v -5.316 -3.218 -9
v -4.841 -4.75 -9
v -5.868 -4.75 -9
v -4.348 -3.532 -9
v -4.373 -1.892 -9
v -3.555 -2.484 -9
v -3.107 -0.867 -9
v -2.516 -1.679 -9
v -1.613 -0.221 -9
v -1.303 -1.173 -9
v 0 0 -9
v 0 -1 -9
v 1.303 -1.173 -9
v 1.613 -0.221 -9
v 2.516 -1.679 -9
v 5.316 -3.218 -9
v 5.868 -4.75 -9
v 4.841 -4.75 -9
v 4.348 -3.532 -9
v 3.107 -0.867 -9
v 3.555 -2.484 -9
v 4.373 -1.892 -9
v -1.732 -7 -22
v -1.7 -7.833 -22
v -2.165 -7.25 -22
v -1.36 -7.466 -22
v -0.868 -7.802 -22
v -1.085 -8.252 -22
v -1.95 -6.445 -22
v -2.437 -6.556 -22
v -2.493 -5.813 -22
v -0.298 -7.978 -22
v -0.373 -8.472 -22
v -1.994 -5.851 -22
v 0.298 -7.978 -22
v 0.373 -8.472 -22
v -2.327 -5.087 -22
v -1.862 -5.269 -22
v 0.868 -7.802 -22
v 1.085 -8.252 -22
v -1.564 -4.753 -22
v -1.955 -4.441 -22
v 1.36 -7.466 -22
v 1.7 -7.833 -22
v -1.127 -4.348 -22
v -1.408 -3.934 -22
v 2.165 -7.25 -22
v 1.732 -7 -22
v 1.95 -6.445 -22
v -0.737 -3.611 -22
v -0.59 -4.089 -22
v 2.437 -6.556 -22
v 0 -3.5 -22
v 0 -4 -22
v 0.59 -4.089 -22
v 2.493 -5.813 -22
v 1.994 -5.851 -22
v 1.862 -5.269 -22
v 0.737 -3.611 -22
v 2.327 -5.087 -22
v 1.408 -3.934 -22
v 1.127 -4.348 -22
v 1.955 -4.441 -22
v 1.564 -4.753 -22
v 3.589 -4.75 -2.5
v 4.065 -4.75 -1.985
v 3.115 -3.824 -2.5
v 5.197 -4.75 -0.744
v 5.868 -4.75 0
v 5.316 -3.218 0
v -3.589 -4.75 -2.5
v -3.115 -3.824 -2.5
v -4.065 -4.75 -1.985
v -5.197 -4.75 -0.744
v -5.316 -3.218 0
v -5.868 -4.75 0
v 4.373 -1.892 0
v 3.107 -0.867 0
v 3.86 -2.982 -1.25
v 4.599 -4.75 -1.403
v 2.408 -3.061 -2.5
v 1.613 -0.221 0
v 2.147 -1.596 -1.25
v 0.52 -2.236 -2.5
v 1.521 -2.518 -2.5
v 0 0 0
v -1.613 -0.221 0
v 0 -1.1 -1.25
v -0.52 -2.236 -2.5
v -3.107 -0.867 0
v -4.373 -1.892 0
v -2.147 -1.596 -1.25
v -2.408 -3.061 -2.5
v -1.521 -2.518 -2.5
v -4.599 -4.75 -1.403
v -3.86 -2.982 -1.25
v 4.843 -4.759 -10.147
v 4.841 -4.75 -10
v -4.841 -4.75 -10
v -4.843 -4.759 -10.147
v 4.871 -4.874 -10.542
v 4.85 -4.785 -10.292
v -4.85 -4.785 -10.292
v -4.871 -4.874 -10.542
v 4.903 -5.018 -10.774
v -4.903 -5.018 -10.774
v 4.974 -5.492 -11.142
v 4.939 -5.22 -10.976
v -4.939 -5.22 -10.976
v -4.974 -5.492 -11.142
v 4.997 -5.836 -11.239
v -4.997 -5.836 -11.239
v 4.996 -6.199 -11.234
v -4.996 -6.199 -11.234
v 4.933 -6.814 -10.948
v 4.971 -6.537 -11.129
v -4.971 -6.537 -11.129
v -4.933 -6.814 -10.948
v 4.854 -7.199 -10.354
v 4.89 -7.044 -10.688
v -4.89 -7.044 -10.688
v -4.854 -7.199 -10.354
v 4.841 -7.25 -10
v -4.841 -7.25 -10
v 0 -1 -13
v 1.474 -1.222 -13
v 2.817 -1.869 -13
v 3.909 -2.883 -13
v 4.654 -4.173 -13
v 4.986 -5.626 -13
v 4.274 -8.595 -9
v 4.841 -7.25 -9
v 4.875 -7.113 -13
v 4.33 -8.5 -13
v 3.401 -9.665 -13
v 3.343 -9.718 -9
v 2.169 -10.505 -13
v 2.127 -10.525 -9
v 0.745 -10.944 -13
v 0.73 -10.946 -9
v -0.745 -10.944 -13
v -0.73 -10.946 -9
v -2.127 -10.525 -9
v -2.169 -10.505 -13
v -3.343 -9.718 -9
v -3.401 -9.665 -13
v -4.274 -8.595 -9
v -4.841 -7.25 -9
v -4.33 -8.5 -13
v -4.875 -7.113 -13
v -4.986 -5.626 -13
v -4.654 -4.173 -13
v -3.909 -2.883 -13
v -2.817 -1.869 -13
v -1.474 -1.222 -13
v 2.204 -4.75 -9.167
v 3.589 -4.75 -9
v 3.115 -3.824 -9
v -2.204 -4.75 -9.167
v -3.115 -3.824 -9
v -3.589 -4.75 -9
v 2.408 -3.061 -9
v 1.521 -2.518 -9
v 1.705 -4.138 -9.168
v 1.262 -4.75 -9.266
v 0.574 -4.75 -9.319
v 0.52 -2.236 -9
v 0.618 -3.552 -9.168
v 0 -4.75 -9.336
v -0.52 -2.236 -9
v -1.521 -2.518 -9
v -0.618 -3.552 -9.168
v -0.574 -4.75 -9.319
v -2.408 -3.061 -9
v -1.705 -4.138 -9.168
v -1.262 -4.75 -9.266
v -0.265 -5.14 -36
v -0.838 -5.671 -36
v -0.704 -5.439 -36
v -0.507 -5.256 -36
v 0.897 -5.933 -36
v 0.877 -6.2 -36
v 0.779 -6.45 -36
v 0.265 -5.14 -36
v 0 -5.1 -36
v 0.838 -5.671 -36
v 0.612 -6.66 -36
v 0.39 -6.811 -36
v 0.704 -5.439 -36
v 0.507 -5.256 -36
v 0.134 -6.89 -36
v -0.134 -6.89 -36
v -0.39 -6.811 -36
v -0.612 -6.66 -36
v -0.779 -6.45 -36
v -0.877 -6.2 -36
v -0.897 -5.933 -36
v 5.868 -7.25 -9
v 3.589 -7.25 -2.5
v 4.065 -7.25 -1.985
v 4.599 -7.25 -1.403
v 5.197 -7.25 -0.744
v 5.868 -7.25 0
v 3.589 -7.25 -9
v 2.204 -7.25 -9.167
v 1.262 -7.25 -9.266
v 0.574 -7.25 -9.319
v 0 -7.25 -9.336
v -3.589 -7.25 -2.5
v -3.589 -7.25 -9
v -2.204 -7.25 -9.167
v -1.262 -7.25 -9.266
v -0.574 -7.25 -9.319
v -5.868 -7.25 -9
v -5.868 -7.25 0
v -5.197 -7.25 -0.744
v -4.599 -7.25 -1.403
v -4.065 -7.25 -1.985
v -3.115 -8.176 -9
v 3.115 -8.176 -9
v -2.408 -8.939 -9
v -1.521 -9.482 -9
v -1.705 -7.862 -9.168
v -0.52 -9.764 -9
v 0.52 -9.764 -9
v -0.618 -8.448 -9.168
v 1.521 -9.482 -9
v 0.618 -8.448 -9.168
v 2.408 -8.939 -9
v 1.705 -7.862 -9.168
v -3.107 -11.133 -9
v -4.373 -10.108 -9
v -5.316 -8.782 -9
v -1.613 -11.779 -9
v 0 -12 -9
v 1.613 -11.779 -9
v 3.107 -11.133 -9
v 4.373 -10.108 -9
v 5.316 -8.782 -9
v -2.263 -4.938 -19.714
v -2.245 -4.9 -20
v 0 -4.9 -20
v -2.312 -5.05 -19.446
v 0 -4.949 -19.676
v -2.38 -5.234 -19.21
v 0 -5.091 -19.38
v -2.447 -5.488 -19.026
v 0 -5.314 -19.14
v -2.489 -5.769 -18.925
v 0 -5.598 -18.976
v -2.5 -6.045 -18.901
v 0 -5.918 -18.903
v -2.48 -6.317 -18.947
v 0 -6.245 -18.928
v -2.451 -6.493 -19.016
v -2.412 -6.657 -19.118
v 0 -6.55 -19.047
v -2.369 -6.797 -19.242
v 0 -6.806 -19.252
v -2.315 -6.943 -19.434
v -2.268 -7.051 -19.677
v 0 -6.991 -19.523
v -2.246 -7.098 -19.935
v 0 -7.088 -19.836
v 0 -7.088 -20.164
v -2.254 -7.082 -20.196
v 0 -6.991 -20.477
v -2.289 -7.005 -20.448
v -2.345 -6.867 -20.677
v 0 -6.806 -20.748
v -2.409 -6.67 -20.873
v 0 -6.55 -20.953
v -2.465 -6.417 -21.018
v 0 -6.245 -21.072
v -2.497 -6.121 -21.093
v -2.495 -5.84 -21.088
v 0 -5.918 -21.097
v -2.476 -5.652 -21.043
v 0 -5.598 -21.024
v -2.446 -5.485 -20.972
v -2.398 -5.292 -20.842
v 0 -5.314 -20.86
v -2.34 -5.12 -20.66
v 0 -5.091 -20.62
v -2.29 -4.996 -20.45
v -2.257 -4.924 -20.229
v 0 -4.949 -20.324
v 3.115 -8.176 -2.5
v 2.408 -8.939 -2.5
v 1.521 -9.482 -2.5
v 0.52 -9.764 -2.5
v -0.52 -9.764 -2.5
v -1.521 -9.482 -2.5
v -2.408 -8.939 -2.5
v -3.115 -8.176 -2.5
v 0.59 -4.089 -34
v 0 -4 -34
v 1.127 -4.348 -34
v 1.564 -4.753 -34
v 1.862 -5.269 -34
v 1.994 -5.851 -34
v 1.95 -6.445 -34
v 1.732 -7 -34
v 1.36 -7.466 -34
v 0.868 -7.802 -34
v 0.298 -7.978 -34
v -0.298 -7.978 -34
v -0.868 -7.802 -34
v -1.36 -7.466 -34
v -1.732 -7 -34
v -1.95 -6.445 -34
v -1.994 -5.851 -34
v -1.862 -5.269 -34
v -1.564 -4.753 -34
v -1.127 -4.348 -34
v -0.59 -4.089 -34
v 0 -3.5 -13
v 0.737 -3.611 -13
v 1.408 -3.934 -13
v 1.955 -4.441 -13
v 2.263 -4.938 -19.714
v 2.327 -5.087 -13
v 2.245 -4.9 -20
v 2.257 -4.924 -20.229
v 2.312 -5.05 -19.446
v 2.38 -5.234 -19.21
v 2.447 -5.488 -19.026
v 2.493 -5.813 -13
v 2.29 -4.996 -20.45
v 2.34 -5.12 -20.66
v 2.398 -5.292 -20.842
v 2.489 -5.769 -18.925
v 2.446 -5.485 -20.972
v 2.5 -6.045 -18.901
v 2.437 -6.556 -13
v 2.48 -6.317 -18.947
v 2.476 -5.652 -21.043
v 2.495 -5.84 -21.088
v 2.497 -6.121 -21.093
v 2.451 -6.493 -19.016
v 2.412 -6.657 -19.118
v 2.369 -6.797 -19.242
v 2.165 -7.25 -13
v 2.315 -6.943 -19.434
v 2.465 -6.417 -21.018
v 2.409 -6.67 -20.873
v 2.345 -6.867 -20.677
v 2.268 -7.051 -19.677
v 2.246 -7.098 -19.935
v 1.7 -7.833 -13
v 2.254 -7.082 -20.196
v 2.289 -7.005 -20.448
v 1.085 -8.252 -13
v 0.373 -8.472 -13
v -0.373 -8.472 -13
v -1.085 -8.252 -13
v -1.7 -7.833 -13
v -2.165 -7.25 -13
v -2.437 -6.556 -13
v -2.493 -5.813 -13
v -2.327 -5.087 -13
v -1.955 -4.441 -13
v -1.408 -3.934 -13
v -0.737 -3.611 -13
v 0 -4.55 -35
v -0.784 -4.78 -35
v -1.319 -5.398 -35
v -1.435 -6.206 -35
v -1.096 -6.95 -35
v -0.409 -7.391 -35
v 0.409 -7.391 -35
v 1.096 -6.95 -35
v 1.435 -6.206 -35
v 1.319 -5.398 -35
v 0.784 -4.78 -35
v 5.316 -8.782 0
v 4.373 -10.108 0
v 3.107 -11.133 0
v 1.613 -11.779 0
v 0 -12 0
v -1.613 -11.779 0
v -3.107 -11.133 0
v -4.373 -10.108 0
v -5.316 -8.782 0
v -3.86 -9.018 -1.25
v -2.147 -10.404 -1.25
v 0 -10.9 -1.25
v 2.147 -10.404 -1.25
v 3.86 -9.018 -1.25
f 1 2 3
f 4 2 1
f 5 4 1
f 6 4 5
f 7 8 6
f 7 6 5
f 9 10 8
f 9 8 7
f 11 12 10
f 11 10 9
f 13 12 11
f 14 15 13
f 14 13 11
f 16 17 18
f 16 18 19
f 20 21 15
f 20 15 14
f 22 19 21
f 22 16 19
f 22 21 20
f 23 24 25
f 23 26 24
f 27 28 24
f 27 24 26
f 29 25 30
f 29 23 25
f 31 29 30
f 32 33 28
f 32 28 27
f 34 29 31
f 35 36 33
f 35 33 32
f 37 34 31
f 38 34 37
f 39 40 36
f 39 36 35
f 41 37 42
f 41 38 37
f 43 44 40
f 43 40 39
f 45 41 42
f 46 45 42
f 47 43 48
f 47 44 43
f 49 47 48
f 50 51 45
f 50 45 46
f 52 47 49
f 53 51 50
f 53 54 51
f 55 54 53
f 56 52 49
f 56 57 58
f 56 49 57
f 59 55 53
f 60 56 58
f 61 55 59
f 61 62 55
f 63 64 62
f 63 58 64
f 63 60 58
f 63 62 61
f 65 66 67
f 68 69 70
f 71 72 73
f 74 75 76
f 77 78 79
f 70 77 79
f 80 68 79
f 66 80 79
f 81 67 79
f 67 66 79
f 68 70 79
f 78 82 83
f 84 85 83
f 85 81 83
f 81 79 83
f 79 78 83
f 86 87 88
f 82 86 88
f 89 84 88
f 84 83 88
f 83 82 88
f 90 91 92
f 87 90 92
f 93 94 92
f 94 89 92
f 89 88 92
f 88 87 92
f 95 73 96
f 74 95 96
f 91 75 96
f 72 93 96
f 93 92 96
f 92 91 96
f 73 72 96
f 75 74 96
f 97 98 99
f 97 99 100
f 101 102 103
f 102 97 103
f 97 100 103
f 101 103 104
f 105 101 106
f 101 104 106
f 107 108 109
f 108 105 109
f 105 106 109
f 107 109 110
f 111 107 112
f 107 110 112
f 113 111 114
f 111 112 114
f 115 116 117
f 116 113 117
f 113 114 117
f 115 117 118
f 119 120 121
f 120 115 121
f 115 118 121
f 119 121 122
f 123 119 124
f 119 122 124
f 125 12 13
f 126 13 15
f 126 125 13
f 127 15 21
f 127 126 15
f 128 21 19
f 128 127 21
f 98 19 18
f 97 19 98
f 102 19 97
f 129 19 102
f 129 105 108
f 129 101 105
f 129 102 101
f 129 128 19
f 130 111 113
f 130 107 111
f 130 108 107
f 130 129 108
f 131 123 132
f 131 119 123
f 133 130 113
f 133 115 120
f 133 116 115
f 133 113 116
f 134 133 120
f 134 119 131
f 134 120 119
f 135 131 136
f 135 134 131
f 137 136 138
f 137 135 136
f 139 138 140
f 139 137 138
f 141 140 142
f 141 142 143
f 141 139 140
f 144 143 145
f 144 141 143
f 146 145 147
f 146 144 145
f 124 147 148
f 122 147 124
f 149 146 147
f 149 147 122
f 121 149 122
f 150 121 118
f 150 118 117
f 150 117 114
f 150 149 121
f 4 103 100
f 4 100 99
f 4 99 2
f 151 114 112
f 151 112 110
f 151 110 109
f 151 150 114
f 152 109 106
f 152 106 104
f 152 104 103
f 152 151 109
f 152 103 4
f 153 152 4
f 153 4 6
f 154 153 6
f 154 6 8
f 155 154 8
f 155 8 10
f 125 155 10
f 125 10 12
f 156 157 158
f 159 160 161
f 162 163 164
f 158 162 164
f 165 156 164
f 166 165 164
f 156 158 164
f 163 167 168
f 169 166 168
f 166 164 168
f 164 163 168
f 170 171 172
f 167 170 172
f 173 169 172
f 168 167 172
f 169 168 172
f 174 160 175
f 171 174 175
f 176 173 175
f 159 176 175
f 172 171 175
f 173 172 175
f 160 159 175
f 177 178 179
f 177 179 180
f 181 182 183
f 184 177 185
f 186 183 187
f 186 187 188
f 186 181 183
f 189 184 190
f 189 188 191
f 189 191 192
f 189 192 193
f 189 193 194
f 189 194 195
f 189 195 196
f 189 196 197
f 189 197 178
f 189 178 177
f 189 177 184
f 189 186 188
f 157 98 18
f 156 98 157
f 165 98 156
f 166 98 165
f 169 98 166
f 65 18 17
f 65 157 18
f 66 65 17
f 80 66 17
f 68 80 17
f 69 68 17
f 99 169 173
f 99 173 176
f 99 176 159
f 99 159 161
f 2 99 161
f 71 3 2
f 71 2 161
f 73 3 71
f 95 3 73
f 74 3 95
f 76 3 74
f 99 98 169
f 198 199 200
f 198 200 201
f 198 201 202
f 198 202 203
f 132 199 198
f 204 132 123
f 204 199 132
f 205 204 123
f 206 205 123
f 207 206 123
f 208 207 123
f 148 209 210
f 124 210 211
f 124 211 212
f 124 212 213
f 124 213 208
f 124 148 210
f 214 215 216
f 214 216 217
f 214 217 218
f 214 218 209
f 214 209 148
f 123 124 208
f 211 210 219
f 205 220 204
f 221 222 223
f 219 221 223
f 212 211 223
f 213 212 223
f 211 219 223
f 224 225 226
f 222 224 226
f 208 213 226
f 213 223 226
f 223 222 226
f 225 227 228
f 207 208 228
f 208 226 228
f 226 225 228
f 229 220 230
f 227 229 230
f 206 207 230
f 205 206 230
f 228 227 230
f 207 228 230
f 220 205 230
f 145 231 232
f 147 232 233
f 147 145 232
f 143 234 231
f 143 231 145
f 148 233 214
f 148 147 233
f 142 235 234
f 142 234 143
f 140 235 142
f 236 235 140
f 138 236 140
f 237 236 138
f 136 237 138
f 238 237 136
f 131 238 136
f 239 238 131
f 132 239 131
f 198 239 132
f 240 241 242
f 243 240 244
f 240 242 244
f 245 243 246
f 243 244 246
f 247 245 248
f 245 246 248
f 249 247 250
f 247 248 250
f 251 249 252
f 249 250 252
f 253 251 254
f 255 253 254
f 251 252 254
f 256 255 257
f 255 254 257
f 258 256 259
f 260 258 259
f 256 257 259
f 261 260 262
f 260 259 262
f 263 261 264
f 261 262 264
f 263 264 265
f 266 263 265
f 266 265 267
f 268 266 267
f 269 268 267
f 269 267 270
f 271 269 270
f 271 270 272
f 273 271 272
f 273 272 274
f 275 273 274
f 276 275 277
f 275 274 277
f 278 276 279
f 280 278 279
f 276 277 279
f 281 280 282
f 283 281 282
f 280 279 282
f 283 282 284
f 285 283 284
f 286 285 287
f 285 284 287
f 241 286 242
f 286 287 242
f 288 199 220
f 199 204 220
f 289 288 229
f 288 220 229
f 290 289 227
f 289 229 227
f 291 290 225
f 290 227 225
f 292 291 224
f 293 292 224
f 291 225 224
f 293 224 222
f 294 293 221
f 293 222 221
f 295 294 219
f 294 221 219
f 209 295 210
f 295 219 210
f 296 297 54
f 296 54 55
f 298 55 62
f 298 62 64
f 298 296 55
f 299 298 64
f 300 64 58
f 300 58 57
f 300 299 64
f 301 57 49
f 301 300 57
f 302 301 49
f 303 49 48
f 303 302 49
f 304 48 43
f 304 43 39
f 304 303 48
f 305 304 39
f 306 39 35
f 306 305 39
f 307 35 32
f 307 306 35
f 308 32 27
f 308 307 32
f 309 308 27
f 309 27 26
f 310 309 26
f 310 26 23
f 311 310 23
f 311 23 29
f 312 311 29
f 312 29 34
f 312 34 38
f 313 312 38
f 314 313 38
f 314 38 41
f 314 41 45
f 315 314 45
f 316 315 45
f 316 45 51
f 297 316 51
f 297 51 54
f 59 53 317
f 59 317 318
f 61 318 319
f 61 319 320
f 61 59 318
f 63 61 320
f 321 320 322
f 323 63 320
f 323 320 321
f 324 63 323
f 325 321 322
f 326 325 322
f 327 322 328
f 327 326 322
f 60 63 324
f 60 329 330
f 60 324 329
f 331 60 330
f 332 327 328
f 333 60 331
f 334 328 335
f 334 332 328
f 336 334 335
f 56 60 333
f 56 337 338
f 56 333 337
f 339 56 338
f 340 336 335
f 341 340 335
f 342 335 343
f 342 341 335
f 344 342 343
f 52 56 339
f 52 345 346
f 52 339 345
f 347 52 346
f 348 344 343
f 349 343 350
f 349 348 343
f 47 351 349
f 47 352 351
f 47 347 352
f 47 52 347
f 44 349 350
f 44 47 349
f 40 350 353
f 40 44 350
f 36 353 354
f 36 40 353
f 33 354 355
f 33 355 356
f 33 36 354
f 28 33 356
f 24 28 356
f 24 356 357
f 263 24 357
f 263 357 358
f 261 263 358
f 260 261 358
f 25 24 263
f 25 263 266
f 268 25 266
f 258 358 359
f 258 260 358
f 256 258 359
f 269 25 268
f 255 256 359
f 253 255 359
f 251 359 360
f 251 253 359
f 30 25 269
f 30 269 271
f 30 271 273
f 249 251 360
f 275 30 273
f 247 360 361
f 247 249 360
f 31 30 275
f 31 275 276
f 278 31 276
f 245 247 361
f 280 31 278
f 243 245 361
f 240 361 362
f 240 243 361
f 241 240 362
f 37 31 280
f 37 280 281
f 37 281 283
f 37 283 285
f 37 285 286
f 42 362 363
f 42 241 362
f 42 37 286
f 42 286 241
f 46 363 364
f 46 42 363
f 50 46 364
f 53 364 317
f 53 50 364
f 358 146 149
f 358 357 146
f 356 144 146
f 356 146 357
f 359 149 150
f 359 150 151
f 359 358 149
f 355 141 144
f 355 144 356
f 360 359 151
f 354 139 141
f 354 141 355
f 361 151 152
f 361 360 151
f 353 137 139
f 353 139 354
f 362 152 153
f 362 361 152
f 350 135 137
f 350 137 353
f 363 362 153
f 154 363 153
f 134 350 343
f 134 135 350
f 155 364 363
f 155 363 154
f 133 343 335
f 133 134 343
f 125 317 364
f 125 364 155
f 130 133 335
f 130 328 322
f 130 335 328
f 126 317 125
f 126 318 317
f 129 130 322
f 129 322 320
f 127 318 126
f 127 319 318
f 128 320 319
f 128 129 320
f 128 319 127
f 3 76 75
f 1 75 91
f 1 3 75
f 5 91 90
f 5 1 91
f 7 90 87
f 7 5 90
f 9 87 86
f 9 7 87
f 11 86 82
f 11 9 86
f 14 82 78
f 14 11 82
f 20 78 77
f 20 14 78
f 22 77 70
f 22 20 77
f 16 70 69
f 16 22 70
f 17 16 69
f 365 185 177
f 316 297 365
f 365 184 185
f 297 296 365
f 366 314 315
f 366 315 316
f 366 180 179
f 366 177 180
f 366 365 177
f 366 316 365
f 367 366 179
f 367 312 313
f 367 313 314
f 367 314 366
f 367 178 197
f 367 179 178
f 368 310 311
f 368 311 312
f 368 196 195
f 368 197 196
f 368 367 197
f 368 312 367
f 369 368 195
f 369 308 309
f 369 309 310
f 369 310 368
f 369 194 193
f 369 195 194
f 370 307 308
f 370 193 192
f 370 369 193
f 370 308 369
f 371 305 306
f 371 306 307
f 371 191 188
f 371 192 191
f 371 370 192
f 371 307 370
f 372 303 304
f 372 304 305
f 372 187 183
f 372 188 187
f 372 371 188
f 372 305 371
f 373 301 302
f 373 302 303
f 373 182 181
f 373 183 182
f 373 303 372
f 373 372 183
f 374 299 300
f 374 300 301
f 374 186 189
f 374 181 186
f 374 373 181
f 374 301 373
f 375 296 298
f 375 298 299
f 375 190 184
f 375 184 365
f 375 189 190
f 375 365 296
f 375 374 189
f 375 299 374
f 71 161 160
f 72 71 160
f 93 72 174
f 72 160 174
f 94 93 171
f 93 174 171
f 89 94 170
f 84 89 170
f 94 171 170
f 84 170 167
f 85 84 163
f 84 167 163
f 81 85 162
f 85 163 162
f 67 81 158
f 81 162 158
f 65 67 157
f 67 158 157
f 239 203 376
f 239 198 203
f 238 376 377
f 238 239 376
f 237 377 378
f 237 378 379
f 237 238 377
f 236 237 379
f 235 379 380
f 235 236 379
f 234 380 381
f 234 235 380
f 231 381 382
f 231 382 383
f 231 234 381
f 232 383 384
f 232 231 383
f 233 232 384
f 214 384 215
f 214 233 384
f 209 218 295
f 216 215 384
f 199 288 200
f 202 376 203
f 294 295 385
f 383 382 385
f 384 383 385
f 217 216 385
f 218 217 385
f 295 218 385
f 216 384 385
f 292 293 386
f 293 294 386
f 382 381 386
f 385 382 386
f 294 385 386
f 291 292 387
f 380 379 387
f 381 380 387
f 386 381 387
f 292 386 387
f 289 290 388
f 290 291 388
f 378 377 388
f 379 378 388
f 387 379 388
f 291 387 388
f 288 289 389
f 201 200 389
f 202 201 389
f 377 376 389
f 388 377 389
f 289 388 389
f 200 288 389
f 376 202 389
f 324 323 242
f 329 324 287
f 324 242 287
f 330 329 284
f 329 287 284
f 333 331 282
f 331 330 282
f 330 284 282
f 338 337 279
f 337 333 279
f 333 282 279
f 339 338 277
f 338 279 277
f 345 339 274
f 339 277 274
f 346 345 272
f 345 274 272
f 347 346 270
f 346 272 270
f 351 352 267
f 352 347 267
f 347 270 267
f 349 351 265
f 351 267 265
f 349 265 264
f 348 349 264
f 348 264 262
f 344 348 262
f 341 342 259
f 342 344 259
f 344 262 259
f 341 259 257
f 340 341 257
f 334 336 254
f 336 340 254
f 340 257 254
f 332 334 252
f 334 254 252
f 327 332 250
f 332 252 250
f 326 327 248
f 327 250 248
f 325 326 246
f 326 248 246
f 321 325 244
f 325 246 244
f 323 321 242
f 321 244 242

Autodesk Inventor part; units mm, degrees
ref_plane "YZ Plane" through (0, 0, 0) normal (1, 0, 0) x (0, 1, 0)
ref_plane "XZ Plane" through (0, 0, 0) normal (0, 1, 0) x (-1, 0, 0)
ref_plane "XY Plane" through (0, 0, 0) normal (0, 0, 1) x (1, 0, 0)
sketch "Sketch1" plane through (0, 0, 0) normal (1, 0, 0) x (0, 1, 0)
  line L0 (0, 0) -> (0, -9)
  line L1 (0, -9) -> (-1, -9)
  line L2 (-1, -9) -> (-1, -13)
  line L3 (-1, -13) -> (-3.5, -13)
  line L4 (-3.5, -13) -> (-3.5, -22)
  line L5 (-3.5, -22) -> (-4, -22)
  line L6 (-4, -22) -> (-4, -34)
  line L7 (-4, -34) -> (-5.1, -36)
  line L8 (-5.1, -36) -> (-6, -36)
  line L9 (0, 0) -> (-2.2, -2.5)
  line L10 (-2.2, -2.5) -> (-2.2, -9)
  line L11 (-6, -9.5) -> (-6, -36)
  line L12 (-2.2, -9) -> (-6, -9.5)
  dimension "d0" = 9
  dimension "d1" = 4
  dimension "d2" = 1
  dimension "d3" = 2.5
  dimension "d4" = 9
  dimension "d5" = 12
  dimension "d6" = 2
  dimension "d7" = 2
  dimension "d9" = 2.2
  dimension "d10" = 2.5
  dimension "d11" = 6.5
  dimension "d12" = 0.5
  dimension "d14" = 0.5
  dimension "d15" = 1.1
revolve "Revolution1" add sketch "Sketch1" angle 360 about axis through (0, -6, -9.5) along (0, 0, -1)
sketch "Sketch3" plane through (0, 0, 0) normal (1, 0, 0) x (0, 1, 0)
  line L0 (-4.75, 0) -> (-7.25, 0)
  line L1 (-7.25, 0) -> (-7.25, -10)
  line L2 (-4.75, -10) -> (-4.75, 0)
  arc A0 (-7.25, -10) -> (-4.75, -10) centre (-6, -10) ccw
  line L3 (0, -43.2) -> (0, 7.2) projected
  line L4 (-14.4, 0) -> (2.4, 0) projected
  point P0 (0, 0)
  dimension "d19" = 2.5
  dimension "d20" = 10
  dimension "d21" = 6
extrude "Extrusion1" cut sketch "Sketch3" along normal through all both and the other way through all
sketch "Sketch4" plane through (0, 0, 0) normal (1, 0, 0) x (0, 1, 0)
  circle A0 centre (-6, -20) radius 1.1
  line L0 (0, -43.2) -> (0, 7.2) projected
  line L1 (-14.4, 0) -> (2.4, 0) projected
  point P0 (0, 0)
  dimension "d24" = 2.2
  dimension "d25" = 6
  dimension "d26" = 20
extrude "Extrusion2" cut sketch "Sketch4" along normal through all both and the other way through all
thread "Thread1" size "M4x0.7" class "6g" standard "ANSI Metric M Profile" length 8
properties part number "RCT-H005"
